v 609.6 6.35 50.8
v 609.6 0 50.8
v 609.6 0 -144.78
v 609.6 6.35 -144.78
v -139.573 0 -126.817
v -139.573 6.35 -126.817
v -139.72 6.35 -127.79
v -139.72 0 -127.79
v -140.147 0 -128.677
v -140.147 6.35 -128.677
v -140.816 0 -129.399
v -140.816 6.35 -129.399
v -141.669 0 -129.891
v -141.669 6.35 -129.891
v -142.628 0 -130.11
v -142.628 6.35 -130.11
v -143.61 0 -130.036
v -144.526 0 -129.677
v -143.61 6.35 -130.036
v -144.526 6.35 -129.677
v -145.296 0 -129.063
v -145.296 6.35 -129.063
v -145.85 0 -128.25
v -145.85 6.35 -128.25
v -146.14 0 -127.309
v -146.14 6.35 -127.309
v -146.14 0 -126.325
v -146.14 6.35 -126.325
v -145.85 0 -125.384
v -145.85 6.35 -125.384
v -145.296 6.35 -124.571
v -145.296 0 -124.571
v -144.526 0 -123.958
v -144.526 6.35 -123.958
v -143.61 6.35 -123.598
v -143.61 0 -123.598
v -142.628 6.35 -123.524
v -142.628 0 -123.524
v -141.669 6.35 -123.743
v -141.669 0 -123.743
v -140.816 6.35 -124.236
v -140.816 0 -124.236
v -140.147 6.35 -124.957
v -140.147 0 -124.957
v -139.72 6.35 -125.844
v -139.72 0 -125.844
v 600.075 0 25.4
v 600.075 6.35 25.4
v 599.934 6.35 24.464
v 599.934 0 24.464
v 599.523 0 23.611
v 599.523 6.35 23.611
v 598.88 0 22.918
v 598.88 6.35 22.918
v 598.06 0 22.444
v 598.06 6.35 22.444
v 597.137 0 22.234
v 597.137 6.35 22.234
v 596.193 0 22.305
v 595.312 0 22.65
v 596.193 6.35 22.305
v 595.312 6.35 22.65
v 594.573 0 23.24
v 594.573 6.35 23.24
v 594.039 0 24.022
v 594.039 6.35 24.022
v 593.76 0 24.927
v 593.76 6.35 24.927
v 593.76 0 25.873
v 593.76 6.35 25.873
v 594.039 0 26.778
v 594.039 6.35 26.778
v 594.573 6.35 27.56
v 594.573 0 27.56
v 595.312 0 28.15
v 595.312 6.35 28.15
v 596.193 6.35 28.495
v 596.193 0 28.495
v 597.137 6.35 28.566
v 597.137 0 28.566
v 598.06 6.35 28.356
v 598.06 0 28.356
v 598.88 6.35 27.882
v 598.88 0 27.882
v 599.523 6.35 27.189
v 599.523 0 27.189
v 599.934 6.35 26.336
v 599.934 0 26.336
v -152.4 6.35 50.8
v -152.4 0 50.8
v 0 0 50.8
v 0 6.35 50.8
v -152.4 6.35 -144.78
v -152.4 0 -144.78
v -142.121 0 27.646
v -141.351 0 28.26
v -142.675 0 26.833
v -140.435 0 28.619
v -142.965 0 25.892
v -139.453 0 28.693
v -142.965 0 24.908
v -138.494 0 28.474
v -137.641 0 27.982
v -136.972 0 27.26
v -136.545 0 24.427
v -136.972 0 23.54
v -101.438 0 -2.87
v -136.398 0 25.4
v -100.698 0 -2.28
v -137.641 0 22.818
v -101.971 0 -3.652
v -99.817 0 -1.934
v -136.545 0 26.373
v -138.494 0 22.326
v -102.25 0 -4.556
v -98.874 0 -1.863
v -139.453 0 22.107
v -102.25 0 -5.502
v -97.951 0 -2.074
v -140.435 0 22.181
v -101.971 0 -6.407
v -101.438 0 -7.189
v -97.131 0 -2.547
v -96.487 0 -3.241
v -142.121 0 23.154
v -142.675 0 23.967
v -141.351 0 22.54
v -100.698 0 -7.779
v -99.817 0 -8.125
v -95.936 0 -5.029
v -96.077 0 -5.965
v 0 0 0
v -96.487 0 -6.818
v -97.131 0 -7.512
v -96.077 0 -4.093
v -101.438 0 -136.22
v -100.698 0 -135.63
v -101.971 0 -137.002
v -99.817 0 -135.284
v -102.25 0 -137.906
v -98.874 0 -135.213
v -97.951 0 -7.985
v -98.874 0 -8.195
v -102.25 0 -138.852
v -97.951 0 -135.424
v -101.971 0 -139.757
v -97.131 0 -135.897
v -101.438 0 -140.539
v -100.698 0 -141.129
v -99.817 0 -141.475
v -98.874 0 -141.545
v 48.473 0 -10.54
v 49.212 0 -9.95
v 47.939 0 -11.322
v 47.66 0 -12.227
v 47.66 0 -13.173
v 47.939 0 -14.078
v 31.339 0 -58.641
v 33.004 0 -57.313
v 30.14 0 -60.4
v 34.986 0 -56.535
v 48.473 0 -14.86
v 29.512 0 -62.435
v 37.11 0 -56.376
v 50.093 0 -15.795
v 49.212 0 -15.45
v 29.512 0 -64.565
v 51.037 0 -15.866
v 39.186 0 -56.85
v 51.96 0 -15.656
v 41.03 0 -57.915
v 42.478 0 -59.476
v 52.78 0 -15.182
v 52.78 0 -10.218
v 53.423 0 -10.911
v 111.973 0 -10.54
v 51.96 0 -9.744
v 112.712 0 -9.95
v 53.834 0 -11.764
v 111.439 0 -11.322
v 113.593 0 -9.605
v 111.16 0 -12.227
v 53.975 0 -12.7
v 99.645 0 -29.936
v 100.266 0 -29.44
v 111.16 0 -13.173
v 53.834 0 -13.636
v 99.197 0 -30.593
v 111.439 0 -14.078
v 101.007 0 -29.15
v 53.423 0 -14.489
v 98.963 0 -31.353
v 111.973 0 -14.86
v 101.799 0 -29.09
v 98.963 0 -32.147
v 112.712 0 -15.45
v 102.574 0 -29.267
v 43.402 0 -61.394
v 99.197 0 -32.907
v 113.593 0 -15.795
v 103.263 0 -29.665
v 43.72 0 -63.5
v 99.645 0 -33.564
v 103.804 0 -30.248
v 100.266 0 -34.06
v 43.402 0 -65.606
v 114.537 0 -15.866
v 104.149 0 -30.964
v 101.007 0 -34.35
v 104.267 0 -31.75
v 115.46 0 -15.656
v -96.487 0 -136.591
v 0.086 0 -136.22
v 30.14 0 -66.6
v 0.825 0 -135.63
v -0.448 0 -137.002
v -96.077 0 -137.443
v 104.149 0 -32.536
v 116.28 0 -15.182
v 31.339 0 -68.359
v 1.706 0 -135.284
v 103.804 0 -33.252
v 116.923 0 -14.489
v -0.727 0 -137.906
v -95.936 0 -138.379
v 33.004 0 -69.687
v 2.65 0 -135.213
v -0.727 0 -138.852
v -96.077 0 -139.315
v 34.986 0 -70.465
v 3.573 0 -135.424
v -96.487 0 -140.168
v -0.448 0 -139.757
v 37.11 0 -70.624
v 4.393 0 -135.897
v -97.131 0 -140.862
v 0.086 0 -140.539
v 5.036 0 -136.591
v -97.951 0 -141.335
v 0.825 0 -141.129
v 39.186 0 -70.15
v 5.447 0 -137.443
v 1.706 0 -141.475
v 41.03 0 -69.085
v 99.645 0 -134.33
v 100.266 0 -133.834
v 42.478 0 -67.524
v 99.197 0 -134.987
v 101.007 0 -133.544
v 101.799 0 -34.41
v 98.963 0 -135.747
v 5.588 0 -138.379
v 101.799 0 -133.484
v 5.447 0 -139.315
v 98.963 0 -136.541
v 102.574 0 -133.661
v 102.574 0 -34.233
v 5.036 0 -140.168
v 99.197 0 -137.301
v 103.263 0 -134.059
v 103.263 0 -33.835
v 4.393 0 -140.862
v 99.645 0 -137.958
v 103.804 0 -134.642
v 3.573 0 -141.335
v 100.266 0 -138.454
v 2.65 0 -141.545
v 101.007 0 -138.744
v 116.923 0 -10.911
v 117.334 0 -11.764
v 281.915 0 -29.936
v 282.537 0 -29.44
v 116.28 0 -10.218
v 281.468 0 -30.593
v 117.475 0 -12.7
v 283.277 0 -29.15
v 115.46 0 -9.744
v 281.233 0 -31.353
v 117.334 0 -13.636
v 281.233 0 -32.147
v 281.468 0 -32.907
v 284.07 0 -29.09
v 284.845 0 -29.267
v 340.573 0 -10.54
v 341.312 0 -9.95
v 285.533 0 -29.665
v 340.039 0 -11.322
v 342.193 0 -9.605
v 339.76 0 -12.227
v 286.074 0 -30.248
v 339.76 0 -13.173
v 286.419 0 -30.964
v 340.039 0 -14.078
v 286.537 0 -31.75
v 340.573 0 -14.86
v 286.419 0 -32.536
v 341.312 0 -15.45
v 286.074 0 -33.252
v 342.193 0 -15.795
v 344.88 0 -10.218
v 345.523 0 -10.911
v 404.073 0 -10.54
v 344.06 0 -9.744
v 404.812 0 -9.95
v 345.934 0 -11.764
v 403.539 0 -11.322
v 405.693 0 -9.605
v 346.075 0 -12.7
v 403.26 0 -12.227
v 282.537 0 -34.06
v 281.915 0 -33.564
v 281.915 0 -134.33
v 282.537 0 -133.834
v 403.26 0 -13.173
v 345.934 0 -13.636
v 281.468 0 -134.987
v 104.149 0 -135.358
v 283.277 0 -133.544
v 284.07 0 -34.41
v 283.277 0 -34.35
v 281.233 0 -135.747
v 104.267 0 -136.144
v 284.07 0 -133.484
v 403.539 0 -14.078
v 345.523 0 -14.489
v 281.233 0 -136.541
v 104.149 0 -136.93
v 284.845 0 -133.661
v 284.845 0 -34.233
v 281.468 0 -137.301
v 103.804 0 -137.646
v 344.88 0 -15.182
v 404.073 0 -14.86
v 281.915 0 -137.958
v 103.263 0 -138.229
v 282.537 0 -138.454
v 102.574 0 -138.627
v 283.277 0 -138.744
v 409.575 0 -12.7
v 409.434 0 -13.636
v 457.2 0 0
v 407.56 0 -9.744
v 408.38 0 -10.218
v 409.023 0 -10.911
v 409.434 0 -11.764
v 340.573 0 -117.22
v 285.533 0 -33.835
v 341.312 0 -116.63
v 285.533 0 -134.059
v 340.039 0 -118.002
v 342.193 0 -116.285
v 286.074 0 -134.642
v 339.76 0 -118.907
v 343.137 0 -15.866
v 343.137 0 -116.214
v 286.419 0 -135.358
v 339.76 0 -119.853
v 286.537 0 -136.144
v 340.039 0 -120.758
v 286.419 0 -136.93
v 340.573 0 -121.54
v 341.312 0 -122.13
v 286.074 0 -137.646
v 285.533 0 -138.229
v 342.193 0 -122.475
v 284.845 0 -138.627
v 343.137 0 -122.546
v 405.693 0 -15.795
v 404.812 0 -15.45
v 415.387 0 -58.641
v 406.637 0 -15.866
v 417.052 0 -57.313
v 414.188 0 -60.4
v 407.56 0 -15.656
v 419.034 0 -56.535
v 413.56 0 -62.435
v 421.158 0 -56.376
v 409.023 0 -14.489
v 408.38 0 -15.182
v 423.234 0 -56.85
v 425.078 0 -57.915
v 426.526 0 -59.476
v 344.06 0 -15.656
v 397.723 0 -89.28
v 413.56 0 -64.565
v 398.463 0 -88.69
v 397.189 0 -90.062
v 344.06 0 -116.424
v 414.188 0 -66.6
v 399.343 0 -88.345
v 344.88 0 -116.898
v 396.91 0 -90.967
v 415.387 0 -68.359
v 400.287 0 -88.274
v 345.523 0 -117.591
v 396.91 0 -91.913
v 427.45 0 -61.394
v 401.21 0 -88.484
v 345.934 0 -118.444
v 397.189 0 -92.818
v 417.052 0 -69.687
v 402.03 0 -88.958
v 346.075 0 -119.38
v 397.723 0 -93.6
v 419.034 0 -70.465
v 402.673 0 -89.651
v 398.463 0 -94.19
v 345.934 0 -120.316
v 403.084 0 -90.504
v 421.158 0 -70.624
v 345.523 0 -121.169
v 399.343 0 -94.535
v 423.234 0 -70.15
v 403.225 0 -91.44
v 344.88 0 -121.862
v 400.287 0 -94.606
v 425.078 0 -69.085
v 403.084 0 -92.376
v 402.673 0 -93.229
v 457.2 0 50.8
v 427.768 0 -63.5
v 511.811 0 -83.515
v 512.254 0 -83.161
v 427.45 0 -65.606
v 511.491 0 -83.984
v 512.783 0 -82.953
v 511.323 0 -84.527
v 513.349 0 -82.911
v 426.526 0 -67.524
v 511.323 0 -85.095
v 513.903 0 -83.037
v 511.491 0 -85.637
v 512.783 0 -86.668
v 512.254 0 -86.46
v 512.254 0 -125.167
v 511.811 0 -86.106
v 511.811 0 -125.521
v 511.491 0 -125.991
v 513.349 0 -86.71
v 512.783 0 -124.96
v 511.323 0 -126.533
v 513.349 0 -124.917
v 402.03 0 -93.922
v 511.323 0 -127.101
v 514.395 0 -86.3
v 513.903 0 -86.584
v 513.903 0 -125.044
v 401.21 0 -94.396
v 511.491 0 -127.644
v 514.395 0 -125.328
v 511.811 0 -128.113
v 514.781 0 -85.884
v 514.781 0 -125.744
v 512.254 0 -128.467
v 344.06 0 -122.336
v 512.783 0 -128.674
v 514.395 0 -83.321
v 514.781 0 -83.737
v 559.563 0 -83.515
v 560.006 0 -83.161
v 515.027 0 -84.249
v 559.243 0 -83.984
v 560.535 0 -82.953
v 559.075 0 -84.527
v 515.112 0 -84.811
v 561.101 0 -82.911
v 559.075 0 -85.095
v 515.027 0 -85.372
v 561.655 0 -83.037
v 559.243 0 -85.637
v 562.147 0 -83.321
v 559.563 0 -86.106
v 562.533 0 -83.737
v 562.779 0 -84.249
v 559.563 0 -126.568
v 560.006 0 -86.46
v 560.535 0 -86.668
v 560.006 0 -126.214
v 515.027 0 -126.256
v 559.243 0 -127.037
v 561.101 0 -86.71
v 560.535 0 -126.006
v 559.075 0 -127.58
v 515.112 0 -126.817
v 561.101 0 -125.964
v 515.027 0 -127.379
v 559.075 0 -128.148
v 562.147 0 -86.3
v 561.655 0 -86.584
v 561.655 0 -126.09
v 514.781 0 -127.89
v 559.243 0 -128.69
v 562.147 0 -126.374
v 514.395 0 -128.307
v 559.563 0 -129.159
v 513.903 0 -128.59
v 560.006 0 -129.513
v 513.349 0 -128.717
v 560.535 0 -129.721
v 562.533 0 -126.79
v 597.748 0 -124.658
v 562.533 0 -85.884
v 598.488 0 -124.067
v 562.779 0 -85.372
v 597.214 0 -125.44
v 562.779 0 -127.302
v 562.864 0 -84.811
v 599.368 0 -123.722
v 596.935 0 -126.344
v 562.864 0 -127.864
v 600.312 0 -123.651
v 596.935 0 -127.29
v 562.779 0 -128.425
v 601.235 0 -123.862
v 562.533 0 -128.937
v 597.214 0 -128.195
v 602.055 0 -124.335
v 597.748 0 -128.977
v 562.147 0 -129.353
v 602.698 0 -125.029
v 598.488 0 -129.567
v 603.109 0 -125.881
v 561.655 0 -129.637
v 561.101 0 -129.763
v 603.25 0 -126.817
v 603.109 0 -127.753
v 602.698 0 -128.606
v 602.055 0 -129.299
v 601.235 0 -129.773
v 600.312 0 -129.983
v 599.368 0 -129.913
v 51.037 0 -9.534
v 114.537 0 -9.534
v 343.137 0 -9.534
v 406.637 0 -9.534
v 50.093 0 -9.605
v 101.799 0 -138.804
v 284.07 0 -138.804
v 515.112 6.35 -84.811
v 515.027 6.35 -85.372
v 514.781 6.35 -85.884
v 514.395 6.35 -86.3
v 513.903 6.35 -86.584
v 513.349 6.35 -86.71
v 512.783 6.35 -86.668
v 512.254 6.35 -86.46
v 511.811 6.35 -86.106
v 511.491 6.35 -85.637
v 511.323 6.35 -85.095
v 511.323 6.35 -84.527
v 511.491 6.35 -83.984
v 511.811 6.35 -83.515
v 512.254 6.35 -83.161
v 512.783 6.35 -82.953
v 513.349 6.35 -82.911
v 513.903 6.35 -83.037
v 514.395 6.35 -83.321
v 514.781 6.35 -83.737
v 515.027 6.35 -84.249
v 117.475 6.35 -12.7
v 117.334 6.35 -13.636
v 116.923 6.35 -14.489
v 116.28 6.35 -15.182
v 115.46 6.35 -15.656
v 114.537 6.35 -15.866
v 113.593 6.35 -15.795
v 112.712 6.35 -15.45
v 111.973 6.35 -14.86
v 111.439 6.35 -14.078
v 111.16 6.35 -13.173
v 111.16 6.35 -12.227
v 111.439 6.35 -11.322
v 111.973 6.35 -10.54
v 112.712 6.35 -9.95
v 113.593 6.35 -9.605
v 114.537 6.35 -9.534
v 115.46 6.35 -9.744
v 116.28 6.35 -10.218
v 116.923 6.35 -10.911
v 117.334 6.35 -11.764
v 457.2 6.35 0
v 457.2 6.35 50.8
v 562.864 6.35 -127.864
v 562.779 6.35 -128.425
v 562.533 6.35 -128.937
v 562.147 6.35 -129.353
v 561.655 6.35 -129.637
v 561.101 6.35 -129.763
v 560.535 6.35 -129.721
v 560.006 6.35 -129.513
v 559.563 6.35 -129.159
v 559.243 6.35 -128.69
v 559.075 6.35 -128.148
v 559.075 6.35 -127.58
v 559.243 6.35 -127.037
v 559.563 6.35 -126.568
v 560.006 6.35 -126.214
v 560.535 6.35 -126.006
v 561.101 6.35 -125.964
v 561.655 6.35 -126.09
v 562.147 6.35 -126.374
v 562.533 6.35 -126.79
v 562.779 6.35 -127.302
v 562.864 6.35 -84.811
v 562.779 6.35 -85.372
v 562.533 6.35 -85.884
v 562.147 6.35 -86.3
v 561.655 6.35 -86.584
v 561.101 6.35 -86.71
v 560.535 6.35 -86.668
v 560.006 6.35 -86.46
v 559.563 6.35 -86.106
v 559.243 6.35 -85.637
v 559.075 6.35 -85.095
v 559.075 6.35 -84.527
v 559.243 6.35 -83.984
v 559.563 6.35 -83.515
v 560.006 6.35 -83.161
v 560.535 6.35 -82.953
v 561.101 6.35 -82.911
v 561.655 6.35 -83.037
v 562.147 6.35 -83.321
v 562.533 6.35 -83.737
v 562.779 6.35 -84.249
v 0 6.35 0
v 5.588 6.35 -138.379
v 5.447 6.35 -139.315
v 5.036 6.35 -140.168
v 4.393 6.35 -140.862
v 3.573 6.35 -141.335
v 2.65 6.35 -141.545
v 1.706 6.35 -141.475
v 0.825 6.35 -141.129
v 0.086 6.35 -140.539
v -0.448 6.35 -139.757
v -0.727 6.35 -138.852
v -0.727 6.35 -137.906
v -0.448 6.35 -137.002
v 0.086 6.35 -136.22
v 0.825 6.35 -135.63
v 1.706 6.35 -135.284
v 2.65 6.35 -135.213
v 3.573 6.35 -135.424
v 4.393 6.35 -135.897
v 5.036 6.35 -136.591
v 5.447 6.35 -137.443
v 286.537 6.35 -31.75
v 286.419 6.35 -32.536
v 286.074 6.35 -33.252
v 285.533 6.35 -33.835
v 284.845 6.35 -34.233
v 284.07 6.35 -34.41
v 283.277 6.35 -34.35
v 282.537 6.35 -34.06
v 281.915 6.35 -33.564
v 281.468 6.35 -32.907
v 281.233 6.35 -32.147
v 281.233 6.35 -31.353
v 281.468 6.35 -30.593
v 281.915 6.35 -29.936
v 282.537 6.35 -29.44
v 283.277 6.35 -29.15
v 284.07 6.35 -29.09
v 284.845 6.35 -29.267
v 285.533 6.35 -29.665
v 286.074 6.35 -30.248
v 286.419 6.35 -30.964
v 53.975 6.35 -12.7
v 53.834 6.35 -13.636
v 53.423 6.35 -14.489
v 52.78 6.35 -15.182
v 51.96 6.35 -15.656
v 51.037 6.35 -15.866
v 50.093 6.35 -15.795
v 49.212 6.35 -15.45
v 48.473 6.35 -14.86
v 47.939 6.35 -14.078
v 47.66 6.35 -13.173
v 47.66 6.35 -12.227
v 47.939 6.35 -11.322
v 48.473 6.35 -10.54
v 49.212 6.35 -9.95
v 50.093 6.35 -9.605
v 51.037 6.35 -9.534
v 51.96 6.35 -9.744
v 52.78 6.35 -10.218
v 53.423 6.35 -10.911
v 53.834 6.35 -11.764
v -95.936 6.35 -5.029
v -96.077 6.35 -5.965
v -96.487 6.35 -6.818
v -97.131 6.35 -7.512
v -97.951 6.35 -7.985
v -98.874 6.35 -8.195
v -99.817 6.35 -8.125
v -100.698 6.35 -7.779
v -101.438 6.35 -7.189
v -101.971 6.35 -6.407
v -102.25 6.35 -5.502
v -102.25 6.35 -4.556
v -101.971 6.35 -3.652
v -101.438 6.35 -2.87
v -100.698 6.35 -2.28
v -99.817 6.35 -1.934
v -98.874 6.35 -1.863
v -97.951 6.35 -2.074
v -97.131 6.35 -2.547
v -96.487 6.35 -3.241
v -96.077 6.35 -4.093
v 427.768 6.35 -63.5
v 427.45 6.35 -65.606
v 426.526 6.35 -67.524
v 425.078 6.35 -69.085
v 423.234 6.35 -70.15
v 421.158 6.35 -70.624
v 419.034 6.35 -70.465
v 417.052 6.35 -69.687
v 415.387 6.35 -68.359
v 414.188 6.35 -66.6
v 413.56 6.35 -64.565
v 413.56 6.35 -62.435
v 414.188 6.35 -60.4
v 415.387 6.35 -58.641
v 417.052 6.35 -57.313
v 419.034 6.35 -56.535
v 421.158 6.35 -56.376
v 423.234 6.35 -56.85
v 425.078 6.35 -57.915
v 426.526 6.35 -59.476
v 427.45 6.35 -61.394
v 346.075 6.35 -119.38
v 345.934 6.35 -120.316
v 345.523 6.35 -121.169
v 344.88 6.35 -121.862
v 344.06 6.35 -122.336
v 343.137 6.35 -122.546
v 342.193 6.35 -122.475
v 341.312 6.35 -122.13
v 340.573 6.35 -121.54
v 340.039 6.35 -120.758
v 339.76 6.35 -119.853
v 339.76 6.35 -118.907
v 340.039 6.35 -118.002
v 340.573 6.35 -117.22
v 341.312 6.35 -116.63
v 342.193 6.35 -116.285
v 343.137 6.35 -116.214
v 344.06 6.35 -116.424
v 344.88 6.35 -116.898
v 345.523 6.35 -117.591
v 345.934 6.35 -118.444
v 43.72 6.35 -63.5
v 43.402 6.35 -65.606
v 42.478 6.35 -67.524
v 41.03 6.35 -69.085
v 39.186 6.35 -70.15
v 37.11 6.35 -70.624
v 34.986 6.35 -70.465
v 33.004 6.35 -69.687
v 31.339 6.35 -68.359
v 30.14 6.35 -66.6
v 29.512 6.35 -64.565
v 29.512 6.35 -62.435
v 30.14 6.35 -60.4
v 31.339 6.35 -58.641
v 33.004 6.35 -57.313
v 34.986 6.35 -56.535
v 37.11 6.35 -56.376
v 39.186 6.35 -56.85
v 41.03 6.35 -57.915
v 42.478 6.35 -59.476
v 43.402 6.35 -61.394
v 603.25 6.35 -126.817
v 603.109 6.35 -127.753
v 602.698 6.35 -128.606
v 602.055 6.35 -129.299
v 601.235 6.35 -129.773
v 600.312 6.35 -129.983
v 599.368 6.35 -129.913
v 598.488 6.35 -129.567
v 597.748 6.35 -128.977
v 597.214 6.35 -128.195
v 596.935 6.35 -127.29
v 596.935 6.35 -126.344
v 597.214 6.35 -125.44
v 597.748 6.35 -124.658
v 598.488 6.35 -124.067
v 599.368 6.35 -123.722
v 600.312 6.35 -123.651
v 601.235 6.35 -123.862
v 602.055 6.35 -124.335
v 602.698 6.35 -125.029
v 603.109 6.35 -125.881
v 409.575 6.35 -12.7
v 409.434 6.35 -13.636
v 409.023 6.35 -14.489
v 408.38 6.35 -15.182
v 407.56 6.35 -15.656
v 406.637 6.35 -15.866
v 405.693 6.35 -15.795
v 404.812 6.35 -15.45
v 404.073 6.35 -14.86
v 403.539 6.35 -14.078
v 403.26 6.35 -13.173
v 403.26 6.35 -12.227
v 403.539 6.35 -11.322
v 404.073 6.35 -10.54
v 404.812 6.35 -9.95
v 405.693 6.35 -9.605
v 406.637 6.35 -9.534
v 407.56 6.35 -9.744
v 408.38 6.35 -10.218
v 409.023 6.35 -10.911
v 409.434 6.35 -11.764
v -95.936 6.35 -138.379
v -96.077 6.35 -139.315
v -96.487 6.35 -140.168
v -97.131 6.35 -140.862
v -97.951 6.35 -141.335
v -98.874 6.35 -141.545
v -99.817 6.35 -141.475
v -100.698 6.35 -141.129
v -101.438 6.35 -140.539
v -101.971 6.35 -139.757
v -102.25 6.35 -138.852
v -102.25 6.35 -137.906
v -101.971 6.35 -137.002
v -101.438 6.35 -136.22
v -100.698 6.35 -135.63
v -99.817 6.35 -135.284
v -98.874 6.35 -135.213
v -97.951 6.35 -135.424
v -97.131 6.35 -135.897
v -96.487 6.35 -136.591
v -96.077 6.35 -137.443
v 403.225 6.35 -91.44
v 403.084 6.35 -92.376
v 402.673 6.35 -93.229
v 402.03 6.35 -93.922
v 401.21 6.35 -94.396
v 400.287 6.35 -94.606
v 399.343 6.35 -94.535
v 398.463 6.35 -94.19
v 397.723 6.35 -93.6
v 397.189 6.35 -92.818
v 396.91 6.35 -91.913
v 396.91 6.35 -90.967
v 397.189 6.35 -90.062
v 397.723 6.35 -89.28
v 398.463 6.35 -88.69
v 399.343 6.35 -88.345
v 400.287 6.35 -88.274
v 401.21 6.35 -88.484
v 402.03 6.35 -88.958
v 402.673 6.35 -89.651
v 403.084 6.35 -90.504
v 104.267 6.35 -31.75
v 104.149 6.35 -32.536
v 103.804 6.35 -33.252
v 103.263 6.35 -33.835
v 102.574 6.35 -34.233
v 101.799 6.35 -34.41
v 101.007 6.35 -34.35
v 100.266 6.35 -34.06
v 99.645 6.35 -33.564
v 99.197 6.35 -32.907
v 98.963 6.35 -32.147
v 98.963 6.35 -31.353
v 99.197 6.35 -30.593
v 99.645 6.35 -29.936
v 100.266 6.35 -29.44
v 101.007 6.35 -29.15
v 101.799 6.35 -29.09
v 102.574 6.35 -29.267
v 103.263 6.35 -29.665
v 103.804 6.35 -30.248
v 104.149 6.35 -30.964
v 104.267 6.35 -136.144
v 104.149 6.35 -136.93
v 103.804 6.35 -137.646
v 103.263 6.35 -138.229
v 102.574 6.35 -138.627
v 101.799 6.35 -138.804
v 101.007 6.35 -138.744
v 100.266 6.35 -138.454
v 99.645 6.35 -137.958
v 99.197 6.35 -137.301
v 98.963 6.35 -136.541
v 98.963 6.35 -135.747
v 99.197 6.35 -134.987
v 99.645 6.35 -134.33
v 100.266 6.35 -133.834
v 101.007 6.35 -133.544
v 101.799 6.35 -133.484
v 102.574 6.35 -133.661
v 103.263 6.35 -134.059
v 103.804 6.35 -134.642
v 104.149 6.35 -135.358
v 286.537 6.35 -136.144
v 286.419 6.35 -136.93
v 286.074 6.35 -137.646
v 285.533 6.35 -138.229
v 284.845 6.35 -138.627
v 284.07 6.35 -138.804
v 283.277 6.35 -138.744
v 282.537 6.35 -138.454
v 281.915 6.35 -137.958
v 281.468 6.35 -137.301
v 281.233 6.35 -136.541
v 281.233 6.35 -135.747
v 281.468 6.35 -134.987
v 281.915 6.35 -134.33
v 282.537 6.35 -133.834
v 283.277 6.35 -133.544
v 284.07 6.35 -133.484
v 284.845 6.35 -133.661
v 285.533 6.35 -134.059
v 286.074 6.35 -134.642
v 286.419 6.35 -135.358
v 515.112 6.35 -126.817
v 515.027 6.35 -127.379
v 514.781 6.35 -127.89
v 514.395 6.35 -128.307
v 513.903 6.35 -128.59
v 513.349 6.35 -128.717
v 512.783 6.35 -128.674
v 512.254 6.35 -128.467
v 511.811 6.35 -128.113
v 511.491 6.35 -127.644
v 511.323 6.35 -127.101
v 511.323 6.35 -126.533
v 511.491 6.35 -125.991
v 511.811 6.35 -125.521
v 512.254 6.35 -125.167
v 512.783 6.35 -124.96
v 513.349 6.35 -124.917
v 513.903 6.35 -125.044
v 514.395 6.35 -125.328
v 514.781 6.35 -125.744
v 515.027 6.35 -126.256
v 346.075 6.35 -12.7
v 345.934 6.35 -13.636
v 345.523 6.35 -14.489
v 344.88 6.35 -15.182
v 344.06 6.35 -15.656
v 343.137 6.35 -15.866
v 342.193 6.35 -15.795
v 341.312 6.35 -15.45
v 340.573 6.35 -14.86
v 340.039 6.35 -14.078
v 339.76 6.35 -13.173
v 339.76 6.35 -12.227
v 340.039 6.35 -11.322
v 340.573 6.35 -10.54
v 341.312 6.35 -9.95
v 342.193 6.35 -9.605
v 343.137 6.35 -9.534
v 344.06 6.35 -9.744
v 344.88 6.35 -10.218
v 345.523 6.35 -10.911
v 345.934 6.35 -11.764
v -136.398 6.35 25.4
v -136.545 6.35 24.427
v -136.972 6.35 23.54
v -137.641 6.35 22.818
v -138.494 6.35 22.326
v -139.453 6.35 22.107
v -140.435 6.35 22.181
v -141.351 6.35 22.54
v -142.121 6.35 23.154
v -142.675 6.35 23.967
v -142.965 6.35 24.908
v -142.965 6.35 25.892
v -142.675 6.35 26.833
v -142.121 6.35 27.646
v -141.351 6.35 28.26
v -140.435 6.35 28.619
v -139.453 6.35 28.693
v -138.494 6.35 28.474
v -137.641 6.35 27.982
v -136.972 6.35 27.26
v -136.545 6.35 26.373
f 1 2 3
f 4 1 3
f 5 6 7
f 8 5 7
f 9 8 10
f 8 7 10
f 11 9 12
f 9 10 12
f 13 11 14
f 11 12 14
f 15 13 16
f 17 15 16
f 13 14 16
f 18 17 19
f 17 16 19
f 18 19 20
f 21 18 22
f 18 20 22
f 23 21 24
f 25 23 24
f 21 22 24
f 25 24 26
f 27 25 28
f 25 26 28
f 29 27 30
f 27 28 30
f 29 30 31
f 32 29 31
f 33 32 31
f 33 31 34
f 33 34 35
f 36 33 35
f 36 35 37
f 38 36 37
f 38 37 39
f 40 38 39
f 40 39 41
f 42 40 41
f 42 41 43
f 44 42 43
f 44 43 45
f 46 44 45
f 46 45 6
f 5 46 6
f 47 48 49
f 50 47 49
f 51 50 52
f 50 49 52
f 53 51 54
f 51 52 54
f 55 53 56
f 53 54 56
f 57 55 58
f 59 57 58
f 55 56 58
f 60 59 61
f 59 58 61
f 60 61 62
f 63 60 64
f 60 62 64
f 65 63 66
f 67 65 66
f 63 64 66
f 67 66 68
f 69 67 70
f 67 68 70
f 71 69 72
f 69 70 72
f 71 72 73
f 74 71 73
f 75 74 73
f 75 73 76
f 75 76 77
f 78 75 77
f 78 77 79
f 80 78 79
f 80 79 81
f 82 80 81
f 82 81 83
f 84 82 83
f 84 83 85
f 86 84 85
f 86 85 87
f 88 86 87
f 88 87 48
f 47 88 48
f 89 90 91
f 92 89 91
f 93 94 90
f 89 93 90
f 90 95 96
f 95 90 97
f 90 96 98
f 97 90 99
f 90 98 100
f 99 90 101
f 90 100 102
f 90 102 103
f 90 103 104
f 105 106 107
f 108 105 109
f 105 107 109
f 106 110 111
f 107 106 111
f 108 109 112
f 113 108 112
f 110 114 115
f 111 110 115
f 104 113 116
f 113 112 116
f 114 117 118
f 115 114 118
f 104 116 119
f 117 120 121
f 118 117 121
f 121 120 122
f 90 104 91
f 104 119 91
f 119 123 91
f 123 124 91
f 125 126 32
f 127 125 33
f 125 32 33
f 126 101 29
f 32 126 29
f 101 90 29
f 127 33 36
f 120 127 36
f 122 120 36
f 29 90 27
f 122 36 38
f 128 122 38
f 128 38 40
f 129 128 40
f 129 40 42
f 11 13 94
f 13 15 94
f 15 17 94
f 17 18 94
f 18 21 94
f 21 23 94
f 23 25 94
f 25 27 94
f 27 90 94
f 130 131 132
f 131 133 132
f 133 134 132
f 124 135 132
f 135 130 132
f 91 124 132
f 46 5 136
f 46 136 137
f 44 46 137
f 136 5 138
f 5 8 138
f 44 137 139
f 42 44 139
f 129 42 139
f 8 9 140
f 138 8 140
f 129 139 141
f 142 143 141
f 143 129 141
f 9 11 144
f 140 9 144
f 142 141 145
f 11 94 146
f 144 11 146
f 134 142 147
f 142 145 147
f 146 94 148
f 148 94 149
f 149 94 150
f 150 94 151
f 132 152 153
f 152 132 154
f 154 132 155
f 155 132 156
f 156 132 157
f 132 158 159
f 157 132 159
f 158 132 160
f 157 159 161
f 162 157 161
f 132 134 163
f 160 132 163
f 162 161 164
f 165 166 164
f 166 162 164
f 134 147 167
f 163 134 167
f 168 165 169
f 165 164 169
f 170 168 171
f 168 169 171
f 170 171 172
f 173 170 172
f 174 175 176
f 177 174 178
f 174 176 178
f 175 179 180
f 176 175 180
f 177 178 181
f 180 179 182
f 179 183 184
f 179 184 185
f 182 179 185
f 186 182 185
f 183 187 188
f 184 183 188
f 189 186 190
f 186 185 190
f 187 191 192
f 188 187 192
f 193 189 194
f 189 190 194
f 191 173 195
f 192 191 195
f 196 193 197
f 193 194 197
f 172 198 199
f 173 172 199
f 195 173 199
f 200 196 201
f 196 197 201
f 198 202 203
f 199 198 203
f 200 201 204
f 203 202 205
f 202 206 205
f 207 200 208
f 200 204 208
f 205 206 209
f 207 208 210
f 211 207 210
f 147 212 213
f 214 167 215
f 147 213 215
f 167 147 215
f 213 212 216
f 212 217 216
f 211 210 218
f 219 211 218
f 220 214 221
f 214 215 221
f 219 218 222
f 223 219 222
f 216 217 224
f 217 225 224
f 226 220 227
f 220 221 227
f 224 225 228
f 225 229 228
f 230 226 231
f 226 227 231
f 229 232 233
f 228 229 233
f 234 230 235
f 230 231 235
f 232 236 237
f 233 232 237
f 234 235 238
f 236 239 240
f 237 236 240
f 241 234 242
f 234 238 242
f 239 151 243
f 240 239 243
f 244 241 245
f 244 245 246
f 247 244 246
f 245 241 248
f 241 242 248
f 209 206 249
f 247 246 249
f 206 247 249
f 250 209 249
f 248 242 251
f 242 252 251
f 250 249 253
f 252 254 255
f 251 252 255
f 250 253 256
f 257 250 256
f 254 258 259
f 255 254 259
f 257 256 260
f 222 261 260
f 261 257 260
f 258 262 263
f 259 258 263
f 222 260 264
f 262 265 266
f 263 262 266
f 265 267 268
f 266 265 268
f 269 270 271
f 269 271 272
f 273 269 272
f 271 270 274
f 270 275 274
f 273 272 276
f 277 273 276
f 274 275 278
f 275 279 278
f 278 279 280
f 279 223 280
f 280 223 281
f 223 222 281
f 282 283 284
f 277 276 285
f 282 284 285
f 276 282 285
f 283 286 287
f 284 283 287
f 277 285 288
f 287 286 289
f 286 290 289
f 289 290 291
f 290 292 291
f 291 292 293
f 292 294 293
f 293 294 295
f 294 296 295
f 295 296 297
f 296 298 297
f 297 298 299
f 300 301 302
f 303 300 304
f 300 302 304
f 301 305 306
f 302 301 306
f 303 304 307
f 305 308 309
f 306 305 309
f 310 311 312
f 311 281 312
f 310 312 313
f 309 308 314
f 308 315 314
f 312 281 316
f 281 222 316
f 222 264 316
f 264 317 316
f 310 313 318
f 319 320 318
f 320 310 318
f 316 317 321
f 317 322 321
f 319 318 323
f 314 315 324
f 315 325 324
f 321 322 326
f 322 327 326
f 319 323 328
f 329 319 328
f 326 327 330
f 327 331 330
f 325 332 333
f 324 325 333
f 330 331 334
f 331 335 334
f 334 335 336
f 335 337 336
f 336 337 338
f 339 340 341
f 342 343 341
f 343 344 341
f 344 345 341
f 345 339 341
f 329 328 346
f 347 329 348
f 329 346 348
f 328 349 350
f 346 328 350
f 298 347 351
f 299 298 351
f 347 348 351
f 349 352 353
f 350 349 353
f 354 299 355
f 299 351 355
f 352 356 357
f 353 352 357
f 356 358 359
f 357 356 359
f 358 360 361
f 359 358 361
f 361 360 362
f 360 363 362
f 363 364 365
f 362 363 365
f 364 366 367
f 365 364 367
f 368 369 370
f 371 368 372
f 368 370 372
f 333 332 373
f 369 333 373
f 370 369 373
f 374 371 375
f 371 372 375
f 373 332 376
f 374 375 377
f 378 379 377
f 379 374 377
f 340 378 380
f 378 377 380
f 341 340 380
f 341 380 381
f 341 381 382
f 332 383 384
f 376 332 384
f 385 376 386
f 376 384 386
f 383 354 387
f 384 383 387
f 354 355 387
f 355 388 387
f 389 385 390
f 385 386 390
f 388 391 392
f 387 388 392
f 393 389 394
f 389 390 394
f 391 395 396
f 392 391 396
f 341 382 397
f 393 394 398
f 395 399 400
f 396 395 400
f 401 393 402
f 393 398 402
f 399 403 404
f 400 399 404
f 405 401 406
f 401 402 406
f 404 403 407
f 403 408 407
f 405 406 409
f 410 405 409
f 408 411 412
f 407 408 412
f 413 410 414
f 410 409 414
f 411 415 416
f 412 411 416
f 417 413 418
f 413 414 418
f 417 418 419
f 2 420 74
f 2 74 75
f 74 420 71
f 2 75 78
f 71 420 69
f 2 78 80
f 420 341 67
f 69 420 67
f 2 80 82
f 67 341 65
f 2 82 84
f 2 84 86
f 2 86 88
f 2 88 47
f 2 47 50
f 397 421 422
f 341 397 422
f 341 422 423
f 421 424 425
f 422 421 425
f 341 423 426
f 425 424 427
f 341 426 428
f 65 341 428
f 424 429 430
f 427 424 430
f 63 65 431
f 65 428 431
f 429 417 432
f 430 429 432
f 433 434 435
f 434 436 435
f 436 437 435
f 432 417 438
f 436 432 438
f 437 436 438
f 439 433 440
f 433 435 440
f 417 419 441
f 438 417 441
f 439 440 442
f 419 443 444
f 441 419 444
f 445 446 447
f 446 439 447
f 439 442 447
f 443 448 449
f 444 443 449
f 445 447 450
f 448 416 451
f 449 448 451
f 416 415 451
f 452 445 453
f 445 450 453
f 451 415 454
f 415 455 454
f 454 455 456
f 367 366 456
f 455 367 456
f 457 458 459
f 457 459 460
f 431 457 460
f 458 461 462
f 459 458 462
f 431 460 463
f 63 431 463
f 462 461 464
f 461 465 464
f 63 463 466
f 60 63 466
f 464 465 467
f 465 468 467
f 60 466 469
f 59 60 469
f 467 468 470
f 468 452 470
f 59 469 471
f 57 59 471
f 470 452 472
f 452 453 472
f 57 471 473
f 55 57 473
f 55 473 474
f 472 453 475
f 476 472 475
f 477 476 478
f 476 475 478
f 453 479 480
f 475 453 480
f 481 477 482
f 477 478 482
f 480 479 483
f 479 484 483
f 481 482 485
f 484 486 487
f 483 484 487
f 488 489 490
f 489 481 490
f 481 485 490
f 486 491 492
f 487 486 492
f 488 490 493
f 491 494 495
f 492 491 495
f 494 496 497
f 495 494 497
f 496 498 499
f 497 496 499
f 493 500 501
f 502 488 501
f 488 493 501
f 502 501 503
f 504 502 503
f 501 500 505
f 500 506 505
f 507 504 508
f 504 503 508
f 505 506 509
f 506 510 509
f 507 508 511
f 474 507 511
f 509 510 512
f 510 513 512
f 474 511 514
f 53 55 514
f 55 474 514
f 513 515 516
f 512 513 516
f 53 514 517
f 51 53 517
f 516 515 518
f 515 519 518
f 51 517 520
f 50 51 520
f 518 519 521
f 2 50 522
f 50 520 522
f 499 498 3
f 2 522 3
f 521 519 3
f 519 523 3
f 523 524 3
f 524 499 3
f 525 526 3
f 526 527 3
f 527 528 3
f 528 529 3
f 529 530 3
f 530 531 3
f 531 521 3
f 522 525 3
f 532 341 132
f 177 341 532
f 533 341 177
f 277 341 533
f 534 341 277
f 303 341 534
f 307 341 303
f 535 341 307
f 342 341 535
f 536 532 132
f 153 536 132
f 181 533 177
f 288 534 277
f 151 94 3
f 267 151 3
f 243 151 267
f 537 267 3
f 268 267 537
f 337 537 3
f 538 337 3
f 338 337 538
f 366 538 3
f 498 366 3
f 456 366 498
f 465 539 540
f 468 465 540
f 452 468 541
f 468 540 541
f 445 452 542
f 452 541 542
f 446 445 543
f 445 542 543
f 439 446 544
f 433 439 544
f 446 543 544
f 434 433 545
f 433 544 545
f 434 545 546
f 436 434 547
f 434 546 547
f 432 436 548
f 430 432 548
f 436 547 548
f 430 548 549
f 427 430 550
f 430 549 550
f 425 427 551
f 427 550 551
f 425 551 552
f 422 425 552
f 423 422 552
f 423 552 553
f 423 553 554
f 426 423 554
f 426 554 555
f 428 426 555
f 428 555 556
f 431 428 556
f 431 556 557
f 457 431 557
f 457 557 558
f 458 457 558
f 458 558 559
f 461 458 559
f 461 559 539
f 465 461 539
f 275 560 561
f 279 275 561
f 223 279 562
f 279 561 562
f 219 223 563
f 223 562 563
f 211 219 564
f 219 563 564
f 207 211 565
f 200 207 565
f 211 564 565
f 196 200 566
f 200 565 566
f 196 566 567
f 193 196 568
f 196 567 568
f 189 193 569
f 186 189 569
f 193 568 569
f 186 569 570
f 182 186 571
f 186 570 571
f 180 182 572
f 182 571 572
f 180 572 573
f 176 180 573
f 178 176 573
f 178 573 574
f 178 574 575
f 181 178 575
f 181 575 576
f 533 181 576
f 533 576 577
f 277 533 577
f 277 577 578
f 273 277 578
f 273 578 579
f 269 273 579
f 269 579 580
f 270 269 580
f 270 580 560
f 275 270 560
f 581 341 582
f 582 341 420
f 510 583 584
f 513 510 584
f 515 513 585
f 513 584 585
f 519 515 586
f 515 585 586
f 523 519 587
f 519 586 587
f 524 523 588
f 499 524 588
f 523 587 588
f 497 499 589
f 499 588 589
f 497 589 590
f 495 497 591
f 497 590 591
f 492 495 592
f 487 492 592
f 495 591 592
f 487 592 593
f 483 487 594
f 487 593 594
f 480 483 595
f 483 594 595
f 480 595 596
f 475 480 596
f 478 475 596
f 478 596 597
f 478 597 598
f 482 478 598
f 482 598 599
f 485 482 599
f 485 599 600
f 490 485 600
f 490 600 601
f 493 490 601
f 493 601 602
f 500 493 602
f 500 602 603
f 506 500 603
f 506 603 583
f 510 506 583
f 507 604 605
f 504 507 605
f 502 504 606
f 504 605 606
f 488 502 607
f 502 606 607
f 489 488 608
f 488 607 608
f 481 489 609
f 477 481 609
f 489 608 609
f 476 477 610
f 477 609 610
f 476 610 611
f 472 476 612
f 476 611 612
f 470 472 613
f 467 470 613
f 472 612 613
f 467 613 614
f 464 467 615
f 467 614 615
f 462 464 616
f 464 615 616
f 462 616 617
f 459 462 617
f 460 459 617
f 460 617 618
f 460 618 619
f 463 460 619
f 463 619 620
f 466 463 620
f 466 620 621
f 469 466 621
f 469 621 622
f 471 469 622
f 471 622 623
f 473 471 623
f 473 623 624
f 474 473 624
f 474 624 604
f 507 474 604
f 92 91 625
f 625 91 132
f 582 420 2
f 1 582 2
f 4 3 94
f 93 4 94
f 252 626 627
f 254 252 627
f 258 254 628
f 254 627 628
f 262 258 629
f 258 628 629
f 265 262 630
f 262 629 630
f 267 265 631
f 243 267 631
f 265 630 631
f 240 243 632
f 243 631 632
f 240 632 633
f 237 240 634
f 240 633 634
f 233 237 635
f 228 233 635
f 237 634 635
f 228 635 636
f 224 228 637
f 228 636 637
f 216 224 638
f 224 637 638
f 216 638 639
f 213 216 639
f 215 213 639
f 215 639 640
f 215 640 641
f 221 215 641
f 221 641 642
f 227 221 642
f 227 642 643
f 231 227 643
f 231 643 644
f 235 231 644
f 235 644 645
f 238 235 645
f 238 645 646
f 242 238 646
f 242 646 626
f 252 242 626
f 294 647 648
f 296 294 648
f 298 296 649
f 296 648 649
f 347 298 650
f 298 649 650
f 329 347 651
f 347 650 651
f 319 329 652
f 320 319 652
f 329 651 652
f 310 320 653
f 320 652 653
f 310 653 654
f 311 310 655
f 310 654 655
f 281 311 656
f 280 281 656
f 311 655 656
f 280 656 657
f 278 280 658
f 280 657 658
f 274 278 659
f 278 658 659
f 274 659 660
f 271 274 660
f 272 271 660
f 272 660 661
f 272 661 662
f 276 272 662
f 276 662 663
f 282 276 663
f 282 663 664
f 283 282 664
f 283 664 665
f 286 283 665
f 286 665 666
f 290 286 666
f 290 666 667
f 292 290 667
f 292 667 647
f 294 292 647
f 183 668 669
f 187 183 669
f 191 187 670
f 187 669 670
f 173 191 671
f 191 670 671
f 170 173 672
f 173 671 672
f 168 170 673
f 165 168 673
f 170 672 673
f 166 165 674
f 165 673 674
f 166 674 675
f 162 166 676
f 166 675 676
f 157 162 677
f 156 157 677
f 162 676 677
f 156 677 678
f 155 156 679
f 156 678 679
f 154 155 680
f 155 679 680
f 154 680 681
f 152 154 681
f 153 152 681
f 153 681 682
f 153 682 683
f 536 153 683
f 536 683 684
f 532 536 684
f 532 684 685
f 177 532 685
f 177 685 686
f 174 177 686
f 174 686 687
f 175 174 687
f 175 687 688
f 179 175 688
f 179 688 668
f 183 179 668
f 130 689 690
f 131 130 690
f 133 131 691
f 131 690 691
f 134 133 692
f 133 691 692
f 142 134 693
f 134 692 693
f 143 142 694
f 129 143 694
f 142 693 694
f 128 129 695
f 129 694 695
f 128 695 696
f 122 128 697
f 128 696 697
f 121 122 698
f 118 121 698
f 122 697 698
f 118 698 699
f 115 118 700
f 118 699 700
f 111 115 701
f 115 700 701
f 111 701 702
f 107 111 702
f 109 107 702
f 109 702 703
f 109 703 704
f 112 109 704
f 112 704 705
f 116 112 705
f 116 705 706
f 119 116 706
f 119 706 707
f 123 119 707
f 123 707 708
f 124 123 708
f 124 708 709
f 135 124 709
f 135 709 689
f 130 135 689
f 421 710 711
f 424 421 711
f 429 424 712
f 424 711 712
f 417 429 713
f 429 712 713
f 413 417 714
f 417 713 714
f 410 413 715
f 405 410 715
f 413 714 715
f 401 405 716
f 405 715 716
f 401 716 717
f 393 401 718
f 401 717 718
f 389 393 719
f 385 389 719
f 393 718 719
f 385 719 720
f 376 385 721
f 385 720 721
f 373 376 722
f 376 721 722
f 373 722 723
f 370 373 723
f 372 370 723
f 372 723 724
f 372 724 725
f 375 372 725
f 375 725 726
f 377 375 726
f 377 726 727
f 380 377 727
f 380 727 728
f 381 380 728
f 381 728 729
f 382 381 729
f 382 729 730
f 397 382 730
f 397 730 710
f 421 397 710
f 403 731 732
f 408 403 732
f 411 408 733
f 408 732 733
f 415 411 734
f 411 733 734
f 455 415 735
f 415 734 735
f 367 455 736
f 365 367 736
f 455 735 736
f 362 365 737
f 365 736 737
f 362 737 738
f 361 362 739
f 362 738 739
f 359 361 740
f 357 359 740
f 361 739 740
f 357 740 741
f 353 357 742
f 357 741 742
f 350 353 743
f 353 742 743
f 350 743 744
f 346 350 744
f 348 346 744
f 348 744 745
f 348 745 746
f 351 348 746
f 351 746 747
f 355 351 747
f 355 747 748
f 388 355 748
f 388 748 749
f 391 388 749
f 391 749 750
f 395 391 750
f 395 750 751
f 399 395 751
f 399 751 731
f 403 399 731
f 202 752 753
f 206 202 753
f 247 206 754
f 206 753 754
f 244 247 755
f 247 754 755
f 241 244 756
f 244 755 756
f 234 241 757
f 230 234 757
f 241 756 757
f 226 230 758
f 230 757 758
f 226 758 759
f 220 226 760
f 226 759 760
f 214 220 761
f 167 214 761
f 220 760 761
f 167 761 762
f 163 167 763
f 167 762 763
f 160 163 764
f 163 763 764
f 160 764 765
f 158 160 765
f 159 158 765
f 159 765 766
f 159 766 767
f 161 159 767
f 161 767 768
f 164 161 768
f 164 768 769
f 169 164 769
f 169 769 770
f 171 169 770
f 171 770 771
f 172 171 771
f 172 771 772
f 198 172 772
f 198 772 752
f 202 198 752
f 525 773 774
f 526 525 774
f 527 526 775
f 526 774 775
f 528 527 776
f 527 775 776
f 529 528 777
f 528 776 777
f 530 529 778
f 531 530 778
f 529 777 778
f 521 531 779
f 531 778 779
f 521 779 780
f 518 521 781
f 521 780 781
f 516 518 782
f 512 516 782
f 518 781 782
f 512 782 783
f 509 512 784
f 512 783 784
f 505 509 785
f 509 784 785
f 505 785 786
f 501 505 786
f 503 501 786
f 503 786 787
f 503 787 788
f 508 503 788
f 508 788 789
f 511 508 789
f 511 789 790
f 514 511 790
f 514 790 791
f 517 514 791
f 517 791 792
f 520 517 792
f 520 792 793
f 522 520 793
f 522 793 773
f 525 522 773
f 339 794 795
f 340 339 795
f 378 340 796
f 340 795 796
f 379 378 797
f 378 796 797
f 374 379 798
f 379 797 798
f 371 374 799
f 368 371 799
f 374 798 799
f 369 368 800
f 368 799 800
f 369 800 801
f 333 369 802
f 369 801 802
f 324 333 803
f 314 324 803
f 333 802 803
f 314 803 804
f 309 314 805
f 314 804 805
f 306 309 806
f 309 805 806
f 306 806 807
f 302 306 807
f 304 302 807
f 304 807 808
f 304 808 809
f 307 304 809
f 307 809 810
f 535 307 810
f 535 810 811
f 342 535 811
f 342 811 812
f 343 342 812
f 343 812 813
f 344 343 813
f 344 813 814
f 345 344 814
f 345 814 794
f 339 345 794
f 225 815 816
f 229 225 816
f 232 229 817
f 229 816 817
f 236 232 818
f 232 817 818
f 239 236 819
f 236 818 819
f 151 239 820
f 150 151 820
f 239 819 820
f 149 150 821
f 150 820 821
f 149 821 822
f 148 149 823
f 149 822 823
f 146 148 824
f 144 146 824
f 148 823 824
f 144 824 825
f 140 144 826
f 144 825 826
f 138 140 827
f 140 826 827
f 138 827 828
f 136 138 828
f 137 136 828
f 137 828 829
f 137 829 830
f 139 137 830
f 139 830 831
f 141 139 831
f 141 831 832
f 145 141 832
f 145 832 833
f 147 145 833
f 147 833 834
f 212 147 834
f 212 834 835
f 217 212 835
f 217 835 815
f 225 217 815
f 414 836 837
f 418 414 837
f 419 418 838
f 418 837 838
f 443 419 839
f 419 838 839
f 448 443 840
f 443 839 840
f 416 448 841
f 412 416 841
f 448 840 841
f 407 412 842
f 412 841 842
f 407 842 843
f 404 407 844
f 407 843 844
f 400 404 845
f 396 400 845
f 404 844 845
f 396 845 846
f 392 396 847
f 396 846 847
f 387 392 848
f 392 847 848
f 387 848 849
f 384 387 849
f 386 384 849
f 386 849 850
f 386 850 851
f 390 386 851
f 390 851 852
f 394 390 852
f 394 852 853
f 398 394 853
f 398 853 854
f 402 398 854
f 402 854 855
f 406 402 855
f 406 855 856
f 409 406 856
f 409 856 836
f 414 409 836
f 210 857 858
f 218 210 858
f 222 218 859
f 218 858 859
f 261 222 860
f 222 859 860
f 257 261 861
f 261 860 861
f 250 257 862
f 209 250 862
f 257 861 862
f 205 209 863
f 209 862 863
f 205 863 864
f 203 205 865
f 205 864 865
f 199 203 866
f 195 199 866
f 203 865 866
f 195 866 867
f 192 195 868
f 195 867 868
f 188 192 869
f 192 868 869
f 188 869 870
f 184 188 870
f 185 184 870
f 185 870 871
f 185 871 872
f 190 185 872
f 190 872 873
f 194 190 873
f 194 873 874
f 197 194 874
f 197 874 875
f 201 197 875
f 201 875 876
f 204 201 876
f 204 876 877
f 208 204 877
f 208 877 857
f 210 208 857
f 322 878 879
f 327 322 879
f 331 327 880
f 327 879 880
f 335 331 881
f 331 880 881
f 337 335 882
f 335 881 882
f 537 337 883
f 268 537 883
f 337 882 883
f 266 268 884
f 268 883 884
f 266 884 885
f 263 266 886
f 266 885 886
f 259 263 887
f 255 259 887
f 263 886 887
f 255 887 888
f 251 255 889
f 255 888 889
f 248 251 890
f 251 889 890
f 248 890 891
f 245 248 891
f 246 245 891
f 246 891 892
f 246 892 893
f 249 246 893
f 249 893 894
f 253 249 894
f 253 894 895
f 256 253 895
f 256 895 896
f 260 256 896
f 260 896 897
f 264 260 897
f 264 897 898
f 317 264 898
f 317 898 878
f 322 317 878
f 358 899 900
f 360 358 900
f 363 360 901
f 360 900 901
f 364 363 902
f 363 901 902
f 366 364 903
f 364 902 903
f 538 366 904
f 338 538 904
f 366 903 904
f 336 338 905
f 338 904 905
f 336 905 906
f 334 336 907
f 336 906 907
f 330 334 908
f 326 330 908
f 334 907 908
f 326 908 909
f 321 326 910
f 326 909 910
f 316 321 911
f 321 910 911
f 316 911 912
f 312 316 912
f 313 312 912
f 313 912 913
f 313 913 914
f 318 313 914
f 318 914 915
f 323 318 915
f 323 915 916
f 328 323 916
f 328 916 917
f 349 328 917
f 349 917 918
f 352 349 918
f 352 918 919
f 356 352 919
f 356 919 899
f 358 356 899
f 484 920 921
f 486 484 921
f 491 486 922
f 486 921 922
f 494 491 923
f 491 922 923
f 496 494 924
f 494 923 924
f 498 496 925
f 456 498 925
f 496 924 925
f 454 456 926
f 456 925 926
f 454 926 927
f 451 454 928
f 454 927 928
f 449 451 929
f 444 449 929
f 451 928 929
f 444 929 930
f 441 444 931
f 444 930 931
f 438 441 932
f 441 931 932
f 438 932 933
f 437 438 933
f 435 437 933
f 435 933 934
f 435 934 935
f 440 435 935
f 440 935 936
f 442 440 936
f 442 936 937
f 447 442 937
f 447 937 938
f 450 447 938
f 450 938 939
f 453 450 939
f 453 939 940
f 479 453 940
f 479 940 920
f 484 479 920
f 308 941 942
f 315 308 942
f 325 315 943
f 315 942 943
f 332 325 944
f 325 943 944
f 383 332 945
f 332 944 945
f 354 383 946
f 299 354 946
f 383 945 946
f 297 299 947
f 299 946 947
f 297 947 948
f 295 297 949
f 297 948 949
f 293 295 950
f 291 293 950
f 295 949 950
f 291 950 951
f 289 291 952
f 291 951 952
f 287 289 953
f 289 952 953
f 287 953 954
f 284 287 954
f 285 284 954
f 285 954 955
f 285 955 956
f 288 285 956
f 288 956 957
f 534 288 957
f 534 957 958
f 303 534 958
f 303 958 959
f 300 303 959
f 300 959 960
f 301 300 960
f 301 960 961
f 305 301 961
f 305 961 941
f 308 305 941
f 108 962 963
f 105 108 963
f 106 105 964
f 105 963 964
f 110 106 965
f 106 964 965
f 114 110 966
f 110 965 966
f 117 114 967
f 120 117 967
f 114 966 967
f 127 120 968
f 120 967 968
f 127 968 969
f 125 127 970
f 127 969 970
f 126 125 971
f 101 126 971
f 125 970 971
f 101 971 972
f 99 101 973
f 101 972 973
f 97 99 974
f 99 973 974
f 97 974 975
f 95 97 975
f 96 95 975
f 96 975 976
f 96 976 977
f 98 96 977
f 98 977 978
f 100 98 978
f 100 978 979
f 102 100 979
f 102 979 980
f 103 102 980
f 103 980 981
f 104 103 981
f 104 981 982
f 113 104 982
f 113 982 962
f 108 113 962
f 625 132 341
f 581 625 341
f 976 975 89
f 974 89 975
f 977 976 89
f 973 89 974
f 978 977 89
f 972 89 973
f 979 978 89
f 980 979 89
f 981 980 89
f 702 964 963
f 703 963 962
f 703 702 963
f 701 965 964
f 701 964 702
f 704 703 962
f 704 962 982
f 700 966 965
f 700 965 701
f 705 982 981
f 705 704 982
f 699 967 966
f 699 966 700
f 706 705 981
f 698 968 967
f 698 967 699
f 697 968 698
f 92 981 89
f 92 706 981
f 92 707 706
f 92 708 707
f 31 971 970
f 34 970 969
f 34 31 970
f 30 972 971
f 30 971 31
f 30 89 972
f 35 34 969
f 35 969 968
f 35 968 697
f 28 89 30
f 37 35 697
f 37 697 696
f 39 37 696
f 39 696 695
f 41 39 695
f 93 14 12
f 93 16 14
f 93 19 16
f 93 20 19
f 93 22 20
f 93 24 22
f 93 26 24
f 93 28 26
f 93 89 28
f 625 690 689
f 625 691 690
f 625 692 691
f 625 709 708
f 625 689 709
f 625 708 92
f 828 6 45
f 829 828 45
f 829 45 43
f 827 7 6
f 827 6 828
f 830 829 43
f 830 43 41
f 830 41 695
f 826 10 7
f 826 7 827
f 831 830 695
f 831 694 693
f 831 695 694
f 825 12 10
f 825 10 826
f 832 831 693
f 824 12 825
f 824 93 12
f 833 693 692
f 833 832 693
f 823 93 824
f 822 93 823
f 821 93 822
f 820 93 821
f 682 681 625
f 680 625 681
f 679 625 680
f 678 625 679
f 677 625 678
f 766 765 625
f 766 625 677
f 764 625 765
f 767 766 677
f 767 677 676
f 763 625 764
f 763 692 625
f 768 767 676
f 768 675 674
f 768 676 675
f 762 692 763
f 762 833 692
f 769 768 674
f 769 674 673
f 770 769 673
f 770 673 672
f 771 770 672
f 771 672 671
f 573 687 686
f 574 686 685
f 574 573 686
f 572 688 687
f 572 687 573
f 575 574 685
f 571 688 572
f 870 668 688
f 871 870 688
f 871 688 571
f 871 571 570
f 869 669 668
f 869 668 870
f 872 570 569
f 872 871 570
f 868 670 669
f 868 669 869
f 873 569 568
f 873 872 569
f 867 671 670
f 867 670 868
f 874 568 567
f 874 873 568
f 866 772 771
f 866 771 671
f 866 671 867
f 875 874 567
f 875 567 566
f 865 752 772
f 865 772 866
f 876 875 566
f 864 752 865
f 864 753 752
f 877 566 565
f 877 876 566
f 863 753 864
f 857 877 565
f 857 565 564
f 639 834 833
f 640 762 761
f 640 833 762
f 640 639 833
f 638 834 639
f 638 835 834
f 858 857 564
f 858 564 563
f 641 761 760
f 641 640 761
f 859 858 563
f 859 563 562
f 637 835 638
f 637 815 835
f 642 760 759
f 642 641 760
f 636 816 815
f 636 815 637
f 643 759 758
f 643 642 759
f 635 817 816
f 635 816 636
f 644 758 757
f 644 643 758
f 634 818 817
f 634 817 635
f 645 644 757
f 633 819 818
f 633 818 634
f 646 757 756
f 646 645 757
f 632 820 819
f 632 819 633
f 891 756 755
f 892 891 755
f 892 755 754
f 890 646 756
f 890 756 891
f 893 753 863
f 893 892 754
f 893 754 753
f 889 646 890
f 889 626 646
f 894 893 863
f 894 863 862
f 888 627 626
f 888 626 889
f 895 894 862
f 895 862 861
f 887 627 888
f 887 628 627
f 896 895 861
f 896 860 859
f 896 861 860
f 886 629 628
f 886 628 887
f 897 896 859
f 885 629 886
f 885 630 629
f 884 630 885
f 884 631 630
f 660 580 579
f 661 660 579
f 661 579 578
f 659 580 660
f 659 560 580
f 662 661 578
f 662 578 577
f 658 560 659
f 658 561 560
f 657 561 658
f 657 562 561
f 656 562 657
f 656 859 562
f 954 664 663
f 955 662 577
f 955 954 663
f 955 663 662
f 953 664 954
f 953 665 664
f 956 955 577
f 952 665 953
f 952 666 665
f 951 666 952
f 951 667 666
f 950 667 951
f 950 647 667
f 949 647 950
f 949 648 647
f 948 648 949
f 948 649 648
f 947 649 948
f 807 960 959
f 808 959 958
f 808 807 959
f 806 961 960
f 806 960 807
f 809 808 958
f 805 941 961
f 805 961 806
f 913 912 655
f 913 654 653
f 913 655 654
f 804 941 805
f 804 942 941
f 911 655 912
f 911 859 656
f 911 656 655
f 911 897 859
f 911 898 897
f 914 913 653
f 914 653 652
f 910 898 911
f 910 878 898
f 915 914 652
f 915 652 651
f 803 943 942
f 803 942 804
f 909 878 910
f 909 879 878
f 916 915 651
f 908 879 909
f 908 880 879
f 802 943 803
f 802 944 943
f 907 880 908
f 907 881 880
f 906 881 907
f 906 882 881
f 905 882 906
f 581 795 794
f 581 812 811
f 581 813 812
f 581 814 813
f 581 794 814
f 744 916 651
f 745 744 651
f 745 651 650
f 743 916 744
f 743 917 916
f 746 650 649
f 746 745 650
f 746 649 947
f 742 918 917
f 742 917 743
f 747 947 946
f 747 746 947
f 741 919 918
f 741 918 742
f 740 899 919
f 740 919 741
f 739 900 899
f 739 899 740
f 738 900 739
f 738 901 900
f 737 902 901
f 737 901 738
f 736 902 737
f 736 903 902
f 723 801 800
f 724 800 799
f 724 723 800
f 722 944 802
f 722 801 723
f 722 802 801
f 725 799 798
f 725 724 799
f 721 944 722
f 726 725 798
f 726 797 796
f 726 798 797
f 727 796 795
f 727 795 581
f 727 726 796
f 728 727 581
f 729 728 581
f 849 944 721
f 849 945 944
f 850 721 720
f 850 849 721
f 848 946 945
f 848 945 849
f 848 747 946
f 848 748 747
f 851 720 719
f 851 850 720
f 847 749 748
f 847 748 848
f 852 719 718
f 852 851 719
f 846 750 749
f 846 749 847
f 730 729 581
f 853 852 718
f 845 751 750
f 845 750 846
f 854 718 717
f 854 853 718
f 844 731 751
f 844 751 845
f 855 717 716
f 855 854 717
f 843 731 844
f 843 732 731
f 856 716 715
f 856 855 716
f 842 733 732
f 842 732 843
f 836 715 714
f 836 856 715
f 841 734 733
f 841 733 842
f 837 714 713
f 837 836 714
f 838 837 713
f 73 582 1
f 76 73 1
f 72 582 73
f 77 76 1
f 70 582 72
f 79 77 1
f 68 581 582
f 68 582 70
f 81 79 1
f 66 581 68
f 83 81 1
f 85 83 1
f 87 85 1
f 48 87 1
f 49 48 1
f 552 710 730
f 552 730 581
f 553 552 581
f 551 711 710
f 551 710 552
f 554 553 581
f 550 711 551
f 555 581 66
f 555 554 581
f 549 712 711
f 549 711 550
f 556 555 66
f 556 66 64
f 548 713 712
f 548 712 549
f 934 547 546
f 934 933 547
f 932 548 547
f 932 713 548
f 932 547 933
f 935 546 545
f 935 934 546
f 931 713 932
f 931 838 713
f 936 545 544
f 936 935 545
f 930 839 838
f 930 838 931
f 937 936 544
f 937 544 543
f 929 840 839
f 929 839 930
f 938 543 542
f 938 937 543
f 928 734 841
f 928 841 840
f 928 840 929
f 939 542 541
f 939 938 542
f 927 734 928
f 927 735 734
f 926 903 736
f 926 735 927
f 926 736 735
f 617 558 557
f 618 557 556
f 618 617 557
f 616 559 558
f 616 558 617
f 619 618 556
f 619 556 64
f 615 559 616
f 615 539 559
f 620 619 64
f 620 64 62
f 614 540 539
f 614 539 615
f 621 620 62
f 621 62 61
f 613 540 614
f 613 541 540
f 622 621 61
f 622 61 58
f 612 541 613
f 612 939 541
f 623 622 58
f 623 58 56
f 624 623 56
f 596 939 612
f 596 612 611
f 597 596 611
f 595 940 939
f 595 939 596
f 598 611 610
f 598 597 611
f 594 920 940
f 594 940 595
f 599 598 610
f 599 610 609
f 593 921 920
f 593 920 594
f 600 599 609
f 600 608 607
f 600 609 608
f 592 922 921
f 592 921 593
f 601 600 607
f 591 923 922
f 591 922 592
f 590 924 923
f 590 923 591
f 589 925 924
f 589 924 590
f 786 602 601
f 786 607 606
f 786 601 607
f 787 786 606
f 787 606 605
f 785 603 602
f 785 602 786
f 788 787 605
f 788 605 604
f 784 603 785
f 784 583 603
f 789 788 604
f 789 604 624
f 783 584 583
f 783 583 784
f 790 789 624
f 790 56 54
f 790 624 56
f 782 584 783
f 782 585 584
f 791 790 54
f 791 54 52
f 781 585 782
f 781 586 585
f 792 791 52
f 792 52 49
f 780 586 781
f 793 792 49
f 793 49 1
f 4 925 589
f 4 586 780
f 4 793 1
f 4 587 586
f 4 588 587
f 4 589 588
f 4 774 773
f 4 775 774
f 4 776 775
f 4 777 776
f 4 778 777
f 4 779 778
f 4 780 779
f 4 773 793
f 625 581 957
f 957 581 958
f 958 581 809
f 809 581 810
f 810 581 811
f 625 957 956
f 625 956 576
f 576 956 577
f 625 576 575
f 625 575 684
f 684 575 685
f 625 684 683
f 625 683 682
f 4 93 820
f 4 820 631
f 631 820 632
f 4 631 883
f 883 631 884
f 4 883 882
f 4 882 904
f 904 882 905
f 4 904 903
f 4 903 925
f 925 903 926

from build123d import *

# Parameters (mm, degrees)
BOSS_EXTRUDE1_DEPTH = 6.35
SKETCH3_R           = 3.302
SKETCH3_R_2         = 3.175
SKETCH3_R_3         = 7.14375
SKETCH3_R_4         = 1.905
CUT_EXTRUDE1_DEPTH  = 7.62
SKETCH5_R           = 2.667
SKETCH5_R_2         = 3.175
CUT_EXTRUDE2_DEPTH  = 7.62


with BuildPart() as part:
    # Sketch1 → Boss-Extrude1 (new body)
    with BuildSketch(Plane(origin=(0, 0, 0), x_dir=(1, 0, 0), z_dir=(0, 1, 0))):
        Polygon((0, 0), (457.2, 0), (457.2, -50.8), (609.6, -50.8), (609.6, 144.78), (-152.4, 144.78), (-152.4, -50.8), (0, -50.8), align=None)
    extrude(amount=BOSS_EXTRUDE1_DEPTH)

    # Sketch3 → Cut-Extrude1 (cut)
    with BuildSketch(Plane(origin=(0, 6.35, 0), x_dir=(1, 0, 0), z_dir=(0, 1, 0))):
        with Locations((-139.7, -25.4)):
            Circle(SKETCH3_R)
        with Locations((-99.1108, 5.0292)):
            Circle(SKETCH3_R_2)
        with Locations((-142.875, 126.81712)):
            Circle(SKETCH3_R)
        with Locations((-99.1108, 138.3792)):
            Circle(SKETCH3_R_2)
        with Locations((2.413, 138.3792)):
            Circle(SKETCH3_R_2)
        with Locations((36.576, 63.5)):
            Circle(SKETCH3_R_3)
        with Locations((600.075, 126.81712)):
            Circle(SKETCH3_R_2)
        with Locations((596.9, -25.4)):
            Circle(SKETCH3_R_2)
        with Locations((560.959, 127.8636)):
            Circle(SKETCH3_R_4)
        with Locations((513.207, 84.8106)):
            Circle(SKETCH3_R_4)
        with Locations((560.959, 84.8106)):
            Circle(SKETCH3_R_4)
        with Locations((513.207, 126.81712)):
            Circle(SKETCH3_R_4)
        with Locations((420.624, 63.5)):
            Circle(SKETCH3_R_3)
    extrude(amount=-CUT_EXTRUDE1_DEPTH, mode=Mode.SUBTRACT)

    # Sketch5 → Cut-Extrude2 (cut)
    with BuildSketch(Plane(origin=(0, 6.35, 0), x_dir=(1, 0, 0), z_dir=(0, 1, 0))):
        with Locations((101.6, 136.144)):
            Circle(SKETCH5_R)
        with Locations((101.6, 31.75)):
            Circle(SKETCH5_R)
        with Locations((400.05, 91.44)):
            Circle(SKETCH5_R_2)
        with Locations((406.4, 12.7)):
            Circle(SKETCH5_R_2)
        with Locations((342.9, 119.38)):
            Circle(SKETCH5_R_2)
        with Locations((342.9, 12.7)):
            Circle(SKETCH5_R_2)
        with Locations((283.8704, 136.144)):
            Circle(SKETCH5_R)
        with Locations((283.8704, 31.75)):
            Circle(SKETCH5_R)
        with Locations((114.3, 12.7)):
            Circle(SKETCH5_R_2)
        with Locations((50.8, 12.7)):
            Circle(SKETCH5_R_2)
    extrude(amount=-CUT_EXTRUDE2_DEPTH, mode=Mode.SUBTRACT)


solid = part.part
